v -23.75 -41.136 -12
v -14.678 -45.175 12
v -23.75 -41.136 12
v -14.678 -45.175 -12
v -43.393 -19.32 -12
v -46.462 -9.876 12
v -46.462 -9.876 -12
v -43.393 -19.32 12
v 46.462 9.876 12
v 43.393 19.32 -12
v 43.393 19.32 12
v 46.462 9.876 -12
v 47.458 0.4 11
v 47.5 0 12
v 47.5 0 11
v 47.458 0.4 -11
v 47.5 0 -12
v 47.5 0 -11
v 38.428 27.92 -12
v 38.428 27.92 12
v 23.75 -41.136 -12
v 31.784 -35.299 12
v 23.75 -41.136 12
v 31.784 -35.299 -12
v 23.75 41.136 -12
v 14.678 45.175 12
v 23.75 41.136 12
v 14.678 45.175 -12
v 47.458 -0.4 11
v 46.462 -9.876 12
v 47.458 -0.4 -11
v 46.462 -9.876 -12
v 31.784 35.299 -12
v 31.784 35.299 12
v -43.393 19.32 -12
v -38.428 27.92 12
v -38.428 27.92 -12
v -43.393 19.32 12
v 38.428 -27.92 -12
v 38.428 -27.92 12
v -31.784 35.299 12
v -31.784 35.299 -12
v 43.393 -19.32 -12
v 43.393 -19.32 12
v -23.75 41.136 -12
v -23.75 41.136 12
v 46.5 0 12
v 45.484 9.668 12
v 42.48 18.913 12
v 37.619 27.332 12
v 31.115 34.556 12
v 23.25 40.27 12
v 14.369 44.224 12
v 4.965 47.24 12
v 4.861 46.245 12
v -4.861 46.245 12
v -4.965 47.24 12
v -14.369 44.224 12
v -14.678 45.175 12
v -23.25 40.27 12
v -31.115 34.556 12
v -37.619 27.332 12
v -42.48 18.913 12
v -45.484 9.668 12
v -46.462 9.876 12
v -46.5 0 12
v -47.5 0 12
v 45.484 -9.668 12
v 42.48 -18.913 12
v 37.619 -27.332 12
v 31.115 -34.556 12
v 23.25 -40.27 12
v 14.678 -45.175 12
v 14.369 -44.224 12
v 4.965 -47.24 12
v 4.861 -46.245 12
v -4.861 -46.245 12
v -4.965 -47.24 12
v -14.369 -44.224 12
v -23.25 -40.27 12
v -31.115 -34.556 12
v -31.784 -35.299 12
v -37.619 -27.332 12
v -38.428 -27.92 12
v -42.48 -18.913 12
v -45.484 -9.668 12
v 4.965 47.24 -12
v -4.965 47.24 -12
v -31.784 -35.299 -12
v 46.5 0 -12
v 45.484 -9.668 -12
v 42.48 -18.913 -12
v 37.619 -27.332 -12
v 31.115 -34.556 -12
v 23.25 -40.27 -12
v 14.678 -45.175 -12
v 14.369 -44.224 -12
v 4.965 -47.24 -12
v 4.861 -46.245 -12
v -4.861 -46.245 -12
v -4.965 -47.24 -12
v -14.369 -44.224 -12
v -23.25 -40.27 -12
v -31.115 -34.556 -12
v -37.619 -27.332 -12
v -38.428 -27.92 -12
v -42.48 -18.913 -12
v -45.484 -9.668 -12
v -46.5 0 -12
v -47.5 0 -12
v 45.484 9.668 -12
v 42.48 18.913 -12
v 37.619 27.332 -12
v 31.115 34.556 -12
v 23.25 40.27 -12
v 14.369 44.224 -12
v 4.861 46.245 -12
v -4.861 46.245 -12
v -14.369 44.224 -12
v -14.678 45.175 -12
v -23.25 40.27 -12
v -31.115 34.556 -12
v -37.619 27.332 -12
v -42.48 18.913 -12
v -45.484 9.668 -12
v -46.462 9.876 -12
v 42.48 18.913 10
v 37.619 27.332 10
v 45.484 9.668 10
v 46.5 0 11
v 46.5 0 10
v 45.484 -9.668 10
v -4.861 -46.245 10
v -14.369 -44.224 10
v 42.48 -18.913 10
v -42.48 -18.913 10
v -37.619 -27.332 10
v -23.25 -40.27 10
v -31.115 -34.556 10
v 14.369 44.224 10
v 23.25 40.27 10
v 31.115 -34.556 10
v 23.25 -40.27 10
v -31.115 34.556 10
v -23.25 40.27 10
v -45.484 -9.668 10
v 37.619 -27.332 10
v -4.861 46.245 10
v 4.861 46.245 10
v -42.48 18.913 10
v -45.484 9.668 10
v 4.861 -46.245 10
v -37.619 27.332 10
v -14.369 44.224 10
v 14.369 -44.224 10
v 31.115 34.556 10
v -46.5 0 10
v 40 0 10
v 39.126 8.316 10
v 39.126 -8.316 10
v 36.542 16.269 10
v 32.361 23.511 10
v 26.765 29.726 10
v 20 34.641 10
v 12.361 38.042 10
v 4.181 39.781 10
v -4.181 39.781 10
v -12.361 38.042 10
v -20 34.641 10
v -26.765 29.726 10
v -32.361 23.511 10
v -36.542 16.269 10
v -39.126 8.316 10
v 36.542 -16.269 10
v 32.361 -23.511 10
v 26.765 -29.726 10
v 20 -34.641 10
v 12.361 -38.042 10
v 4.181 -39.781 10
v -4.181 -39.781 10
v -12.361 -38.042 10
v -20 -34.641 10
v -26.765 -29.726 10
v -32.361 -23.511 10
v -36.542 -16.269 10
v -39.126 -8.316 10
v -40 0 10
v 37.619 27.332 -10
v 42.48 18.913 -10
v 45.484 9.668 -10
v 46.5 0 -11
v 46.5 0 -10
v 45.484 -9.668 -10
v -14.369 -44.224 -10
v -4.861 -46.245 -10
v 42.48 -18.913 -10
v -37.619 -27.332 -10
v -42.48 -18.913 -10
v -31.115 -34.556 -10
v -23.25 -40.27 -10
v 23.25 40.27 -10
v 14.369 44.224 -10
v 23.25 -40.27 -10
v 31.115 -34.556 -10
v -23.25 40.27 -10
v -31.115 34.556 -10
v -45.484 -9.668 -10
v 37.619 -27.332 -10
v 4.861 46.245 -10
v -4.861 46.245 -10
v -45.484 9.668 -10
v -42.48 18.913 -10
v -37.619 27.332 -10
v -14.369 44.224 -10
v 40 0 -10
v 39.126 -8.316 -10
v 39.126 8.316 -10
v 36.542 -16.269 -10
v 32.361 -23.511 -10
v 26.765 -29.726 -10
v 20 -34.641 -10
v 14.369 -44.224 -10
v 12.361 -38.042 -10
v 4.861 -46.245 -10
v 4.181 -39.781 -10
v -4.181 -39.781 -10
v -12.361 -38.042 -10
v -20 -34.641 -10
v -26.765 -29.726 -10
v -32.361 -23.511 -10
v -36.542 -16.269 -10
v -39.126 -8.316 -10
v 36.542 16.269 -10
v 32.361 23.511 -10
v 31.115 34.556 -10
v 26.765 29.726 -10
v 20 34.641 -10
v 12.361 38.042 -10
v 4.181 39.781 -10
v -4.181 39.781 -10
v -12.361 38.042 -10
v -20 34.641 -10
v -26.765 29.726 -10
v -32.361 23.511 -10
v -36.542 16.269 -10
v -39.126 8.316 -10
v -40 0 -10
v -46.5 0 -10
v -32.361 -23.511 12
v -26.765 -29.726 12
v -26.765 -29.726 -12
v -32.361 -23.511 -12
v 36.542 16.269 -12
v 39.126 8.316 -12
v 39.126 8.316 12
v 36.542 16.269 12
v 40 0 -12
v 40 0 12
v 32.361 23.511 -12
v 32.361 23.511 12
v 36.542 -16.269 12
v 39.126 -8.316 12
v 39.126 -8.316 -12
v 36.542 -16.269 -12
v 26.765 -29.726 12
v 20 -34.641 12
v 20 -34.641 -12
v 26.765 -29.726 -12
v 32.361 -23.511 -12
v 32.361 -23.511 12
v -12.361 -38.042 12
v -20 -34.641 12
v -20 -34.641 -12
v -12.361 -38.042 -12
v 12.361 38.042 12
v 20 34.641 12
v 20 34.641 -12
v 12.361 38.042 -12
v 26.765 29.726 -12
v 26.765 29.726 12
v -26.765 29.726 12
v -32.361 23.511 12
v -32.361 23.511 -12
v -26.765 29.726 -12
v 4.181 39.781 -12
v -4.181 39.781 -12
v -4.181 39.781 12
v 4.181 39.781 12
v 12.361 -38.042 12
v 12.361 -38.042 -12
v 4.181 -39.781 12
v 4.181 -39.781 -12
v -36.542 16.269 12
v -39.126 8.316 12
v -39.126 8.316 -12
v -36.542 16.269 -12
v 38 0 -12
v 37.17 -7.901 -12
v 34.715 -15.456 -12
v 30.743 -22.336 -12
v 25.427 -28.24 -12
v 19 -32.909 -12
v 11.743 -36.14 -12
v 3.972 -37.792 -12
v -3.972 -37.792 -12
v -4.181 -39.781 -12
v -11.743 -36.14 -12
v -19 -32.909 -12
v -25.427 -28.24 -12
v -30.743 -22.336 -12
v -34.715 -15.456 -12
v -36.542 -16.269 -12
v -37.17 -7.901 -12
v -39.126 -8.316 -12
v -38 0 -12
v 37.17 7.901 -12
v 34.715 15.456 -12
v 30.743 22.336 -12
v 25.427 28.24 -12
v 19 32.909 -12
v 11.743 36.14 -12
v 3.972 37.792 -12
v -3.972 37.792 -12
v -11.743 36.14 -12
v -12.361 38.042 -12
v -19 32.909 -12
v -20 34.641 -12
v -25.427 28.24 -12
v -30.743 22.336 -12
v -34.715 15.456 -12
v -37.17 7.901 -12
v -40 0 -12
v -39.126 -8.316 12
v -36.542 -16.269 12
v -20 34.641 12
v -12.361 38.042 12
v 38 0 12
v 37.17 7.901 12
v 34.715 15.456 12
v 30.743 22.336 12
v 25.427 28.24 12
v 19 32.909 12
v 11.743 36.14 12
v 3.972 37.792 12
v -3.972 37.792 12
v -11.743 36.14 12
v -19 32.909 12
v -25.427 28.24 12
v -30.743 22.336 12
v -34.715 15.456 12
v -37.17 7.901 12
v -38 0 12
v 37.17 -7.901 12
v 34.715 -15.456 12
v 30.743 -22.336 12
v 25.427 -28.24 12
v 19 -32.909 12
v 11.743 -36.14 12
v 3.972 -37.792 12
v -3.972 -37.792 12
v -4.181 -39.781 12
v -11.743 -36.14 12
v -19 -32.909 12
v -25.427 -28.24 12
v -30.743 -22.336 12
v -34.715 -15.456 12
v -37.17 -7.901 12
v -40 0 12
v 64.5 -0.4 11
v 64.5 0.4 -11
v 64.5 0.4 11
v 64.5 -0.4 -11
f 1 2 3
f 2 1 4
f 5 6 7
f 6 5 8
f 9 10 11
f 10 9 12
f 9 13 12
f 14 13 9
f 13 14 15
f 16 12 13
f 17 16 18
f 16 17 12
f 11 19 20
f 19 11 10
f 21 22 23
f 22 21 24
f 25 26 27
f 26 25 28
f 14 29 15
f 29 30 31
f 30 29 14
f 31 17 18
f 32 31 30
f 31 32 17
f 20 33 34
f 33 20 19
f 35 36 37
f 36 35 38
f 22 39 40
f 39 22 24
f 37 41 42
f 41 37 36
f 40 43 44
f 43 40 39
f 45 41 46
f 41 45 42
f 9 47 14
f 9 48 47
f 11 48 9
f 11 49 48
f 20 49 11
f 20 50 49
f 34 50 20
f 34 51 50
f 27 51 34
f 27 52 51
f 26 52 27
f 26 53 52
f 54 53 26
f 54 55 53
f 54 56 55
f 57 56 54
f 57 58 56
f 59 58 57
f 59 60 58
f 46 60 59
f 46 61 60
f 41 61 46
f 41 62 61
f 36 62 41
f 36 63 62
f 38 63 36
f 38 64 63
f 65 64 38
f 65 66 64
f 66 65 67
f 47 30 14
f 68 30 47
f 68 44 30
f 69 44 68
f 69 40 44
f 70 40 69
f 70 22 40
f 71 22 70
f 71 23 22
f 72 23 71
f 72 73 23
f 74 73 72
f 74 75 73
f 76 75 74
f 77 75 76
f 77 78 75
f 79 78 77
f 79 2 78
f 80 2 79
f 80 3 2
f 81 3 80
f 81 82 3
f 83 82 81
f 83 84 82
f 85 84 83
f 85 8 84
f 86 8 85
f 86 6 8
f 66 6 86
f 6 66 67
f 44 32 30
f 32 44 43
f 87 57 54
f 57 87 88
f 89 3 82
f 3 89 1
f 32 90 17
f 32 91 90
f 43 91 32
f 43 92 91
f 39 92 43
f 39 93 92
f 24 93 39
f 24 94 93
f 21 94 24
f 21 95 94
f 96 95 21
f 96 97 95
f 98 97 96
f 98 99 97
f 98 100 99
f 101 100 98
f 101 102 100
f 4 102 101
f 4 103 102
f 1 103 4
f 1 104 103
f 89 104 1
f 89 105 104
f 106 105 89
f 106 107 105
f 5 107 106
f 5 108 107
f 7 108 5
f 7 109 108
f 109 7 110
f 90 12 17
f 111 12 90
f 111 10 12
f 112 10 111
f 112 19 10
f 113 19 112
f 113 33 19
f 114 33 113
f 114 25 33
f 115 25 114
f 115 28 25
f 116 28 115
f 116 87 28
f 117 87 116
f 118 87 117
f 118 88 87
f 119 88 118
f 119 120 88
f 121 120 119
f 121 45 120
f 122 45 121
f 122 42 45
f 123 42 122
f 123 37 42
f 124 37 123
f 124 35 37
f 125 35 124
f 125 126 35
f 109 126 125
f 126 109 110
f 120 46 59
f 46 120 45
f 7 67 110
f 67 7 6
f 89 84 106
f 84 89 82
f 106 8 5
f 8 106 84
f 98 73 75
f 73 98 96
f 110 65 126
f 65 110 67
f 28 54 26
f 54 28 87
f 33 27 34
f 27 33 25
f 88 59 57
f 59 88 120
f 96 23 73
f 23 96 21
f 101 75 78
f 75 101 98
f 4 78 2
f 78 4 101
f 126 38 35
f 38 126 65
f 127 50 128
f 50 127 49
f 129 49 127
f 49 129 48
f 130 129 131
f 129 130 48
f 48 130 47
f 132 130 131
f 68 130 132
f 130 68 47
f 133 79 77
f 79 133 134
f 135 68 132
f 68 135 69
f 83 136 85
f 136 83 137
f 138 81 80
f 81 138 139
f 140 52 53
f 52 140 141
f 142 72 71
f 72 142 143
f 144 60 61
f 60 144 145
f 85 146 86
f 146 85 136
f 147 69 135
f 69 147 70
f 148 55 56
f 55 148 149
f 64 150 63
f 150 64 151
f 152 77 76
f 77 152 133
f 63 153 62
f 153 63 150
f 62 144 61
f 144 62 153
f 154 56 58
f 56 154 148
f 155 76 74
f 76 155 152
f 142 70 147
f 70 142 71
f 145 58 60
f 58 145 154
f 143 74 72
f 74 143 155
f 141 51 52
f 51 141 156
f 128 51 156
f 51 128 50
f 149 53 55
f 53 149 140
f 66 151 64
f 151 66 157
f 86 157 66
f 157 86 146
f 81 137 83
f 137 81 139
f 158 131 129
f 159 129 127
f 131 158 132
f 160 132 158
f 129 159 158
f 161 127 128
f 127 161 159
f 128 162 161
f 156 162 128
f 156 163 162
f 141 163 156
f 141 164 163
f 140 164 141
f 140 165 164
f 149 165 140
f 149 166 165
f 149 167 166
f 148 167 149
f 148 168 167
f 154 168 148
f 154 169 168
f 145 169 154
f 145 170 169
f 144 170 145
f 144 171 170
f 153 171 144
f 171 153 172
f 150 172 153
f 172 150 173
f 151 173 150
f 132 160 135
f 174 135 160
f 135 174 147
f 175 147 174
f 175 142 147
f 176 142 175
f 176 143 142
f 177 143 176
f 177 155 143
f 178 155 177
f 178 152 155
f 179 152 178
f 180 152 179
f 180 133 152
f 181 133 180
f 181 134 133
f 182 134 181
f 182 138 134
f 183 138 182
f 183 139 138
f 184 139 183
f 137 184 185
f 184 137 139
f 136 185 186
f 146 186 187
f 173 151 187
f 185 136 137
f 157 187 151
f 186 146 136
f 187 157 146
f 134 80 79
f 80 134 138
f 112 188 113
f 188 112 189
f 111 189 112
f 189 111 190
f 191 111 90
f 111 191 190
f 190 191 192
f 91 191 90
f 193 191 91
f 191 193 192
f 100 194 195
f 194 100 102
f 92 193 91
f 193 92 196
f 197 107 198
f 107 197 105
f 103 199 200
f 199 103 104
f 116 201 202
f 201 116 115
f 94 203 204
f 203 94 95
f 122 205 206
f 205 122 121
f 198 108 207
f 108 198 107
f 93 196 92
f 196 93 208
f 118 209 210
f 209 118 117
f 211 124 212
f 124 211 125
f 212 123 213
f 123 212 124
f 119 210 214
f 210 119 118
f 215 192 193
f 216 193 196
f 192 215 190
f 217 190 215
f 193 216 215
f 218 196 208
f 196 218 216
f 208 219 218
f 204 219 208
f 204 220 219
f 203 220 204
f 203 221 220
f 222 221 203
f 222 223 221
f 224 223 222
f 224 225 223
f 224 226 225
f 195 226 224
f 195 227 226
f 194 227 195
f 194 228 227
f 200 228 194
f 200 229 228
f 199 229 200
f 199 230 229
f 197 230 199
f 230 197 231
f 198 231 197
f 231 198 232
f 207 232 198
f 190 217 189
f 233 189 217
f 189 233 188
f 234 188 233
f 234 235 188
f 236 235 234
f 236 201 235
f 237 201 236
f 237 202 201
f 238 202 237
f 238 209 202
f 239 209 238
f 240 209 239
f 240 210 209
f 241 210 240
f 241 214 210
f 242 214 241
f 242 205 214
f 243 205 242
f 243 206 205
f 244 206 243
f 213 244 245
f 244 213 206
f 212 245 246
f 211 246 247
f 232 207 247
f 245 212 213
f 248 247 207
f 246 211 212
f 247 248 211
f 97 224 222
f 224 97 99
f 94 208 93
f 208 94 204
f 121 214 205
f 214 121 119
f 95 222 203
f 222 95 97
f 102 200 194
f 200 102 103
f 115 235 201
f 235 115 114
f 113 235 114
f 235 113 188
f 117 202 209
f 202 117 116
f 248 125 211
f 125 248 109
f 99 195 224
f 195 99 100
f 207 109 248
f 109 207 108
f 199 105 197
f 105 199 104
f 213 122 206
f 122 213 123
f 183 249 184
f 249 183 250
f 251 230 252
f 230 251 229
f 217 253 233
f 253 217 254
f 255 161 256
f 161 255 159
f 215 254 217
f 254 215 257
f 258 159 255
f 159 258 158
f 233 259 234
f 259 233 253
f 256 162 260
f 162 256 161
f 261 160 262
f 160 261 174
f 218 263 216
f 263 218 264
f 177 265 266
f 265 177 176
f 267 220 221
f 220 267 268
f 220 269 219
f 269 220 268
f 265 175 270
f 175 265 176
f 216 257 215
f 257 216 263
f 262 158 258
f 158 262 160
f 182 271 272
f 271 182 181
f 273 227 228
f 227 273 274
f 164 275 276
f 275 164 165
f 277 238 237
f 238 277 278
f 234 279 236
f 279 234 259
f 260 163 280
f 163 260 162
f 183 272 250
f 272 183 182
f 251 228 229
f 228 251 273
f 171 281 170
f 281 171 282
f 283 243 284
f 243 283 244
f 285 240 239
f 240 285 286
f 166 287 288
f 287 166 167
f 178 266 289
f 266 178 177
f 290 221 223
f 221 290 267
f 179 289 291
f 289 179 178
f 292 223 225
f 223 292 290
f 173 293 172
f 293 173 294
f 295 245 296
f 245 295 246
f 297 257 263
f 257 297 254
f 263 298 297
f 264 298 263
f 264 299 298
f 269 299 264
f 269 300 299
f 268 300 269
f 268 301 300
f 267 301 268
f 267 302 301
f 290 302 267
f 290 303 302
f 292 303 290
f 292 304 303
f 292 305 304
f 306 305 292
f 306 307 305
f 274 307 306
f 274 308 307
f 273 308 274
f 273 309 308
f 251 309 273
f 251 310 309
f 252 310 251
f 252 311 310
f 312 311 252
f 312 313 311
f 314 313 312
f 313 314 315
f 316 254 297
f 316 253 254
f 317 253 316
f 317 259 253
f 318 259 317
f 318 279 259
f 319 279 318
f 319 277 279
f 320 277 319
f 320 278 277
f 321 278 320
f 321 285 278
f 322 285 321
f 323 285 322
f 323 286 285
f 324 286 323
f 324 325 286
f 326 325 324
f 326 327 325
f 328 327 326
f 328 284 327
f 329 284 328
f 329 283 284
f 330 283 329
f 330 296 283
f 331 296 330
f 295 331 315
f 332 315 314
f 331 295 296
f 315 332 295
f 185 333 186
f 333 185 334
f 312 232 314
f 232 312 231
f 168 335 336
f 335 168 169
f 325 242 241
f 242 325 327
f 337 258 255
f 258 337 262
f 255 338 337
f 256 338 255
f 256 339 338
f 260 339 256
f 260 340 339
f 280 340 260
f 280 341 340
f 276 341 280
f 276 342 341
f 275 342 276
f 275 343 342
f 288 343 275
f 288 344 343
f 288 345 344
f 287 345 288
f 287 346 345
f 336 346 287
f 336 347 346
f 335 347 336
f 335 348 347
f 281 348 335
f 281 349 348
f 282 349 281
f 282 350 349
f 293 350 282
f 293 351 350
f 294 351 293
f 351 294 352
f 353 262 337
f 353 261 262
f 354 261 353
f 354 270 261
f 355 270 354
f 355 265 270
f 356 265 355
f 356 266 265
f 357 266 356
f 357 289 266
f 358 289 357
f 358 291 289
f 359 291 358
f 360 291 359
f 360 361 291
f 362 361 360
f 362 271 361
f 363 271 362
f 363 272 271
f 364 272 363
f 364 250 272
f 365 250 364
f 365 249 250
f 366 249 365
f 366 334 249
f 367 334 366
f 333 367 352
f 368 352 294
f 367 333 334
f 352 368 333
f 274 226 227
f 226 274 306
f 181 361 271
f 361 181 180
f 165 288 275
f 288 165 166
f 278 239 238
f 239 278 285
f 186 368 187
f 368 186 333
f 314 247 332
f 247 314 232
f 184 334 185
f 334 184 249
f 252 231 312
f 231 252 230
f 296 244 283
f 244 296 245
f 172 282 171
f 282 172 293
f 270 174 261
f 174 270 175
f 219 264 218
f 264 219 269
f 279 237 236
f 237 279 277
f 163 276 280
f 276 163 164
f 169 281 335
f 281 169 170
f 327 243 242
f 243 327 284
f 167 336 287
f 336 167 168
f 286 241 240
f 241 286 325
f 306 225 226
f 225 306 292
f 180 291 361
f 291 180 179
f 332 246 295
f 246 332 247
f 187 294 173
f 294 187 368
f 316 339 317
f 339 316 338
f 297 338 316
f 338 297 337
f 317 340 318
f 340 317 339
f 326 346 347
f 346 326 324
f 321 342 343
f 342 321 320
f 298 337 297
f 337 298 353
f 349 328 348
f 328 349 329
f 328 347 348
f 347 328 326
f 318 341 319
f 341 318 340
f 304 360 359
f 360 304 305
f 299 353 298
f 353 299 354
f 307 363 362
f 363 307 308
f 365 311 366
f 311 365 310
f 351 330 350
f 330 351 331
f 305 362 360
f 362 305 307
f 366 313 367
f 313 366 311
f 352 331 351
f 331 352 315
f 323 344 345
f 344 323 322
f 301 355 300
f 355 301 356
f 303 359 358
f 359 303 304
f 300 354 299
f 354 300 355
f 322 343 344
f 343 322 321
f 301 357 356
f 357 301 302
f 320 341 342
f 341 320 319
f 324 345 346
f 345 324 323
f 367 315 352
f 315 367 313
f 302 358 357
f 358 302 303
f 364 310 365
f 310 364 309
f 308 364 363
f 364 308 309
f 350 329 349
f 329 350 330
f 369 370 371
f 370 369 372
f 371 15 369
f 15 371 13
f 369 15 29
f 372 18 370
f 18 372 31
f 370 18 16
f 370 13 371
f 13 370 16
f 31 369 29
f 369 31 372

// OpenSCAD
// Parameters
tape_outer_diameter = 95; //[50:190:1]
core_inner_diameter = 76; //[40:152:1]
roll_width = 24; //[12:48:1]
core_wall_thickness = 2; //[1:6:0.5]
tape_radial_thickness = 8; //[3:20:1]
chamfer_size = 1; //[0.5:3:0.5]
overlap = 1; //[0.5:2:0.5]
flap_length = 18; //[8:40:1]
flap_thickness = 0.8; //[0.4:2:0.1]
flap_width_margin = 1; //[0.5:4:0.5]

// Base Shapes
module tape_roll_body() {
  cylinder(r=tape_outer_diameter/2, h=roll_width, center=true);
}

module core_hole() {
  cylinder(r=core_inner_diameter/2, h=roll_width + 2*overlap, center=true);
}

module core_outer_cyl() {
  cylinder(r=core_inner_diameter/2 + core_wall_thickness, h=roll_width, center=true);
}

module tape_inner_void() {
  cylinder(r=tape_outer_diameter/2 - tape_radial_thickness, h=roll_width + 2*overlap, center=true);
}

module chamfer_top_ring() {
  translate([0, 0, roll_width/2 - chamfer_size/2])
    cylinder(r=tape_outer_diameter/2, h=chamfer_size, center=true);
}

module chamfer_bottom_ring() {
  translate([0, 0, -roll_width/2 + chamfer_size/2])
    cylinder(r=tape_outer_diameter/2, h=chamfer_size, center=true);
}

module chamfer_top_inner_cut() {
  translate([0, 0, roll_width/2 - chamfer_size/2])
    cylinder(r=tape_outer_diameter/2 - chamfer_size, h=chamfer_size + 2*overlap, center=true);
}

module chamfer_bottom_inner_cut() {
  translate([0, 0, -roll_width/2 + chamfer_size/2])
    cylinder(r=tape_outer_diameter/2 - chamfer_size, h=chamfer_size + 2*overlap, center=true);
}

module tape_end_flap() {
  translate([tape_outer_diameter/2 + flap_length/2 - overlap, 0, 0])
    cube([flap_length, flap_thickness, roll_width - 2*flap_width_margin], center=true);
}

// Operations
module core_wall() {
  difference() {
    core_outer_cyl();
    core_hole();
  }
}

module tape_body_ring() {
  difference() {
    tape_roll_body();
    tape_inner_void();
  }
}

module tape_edge_chamfers() {
  difference() {
    tape_body_ring();
    chamfer_top_inner_cut();
    chamfer_bottom_inner_cut();
  }
}

module tape_roll_complete() {
  union() {
    tape_edge_chamfers();
    core_wall();
    tape_end_flap();
  }
}

// Final Output
color([0.85, 0.85, 0.8]) // Off-white for tape
tape_roll_complete();
